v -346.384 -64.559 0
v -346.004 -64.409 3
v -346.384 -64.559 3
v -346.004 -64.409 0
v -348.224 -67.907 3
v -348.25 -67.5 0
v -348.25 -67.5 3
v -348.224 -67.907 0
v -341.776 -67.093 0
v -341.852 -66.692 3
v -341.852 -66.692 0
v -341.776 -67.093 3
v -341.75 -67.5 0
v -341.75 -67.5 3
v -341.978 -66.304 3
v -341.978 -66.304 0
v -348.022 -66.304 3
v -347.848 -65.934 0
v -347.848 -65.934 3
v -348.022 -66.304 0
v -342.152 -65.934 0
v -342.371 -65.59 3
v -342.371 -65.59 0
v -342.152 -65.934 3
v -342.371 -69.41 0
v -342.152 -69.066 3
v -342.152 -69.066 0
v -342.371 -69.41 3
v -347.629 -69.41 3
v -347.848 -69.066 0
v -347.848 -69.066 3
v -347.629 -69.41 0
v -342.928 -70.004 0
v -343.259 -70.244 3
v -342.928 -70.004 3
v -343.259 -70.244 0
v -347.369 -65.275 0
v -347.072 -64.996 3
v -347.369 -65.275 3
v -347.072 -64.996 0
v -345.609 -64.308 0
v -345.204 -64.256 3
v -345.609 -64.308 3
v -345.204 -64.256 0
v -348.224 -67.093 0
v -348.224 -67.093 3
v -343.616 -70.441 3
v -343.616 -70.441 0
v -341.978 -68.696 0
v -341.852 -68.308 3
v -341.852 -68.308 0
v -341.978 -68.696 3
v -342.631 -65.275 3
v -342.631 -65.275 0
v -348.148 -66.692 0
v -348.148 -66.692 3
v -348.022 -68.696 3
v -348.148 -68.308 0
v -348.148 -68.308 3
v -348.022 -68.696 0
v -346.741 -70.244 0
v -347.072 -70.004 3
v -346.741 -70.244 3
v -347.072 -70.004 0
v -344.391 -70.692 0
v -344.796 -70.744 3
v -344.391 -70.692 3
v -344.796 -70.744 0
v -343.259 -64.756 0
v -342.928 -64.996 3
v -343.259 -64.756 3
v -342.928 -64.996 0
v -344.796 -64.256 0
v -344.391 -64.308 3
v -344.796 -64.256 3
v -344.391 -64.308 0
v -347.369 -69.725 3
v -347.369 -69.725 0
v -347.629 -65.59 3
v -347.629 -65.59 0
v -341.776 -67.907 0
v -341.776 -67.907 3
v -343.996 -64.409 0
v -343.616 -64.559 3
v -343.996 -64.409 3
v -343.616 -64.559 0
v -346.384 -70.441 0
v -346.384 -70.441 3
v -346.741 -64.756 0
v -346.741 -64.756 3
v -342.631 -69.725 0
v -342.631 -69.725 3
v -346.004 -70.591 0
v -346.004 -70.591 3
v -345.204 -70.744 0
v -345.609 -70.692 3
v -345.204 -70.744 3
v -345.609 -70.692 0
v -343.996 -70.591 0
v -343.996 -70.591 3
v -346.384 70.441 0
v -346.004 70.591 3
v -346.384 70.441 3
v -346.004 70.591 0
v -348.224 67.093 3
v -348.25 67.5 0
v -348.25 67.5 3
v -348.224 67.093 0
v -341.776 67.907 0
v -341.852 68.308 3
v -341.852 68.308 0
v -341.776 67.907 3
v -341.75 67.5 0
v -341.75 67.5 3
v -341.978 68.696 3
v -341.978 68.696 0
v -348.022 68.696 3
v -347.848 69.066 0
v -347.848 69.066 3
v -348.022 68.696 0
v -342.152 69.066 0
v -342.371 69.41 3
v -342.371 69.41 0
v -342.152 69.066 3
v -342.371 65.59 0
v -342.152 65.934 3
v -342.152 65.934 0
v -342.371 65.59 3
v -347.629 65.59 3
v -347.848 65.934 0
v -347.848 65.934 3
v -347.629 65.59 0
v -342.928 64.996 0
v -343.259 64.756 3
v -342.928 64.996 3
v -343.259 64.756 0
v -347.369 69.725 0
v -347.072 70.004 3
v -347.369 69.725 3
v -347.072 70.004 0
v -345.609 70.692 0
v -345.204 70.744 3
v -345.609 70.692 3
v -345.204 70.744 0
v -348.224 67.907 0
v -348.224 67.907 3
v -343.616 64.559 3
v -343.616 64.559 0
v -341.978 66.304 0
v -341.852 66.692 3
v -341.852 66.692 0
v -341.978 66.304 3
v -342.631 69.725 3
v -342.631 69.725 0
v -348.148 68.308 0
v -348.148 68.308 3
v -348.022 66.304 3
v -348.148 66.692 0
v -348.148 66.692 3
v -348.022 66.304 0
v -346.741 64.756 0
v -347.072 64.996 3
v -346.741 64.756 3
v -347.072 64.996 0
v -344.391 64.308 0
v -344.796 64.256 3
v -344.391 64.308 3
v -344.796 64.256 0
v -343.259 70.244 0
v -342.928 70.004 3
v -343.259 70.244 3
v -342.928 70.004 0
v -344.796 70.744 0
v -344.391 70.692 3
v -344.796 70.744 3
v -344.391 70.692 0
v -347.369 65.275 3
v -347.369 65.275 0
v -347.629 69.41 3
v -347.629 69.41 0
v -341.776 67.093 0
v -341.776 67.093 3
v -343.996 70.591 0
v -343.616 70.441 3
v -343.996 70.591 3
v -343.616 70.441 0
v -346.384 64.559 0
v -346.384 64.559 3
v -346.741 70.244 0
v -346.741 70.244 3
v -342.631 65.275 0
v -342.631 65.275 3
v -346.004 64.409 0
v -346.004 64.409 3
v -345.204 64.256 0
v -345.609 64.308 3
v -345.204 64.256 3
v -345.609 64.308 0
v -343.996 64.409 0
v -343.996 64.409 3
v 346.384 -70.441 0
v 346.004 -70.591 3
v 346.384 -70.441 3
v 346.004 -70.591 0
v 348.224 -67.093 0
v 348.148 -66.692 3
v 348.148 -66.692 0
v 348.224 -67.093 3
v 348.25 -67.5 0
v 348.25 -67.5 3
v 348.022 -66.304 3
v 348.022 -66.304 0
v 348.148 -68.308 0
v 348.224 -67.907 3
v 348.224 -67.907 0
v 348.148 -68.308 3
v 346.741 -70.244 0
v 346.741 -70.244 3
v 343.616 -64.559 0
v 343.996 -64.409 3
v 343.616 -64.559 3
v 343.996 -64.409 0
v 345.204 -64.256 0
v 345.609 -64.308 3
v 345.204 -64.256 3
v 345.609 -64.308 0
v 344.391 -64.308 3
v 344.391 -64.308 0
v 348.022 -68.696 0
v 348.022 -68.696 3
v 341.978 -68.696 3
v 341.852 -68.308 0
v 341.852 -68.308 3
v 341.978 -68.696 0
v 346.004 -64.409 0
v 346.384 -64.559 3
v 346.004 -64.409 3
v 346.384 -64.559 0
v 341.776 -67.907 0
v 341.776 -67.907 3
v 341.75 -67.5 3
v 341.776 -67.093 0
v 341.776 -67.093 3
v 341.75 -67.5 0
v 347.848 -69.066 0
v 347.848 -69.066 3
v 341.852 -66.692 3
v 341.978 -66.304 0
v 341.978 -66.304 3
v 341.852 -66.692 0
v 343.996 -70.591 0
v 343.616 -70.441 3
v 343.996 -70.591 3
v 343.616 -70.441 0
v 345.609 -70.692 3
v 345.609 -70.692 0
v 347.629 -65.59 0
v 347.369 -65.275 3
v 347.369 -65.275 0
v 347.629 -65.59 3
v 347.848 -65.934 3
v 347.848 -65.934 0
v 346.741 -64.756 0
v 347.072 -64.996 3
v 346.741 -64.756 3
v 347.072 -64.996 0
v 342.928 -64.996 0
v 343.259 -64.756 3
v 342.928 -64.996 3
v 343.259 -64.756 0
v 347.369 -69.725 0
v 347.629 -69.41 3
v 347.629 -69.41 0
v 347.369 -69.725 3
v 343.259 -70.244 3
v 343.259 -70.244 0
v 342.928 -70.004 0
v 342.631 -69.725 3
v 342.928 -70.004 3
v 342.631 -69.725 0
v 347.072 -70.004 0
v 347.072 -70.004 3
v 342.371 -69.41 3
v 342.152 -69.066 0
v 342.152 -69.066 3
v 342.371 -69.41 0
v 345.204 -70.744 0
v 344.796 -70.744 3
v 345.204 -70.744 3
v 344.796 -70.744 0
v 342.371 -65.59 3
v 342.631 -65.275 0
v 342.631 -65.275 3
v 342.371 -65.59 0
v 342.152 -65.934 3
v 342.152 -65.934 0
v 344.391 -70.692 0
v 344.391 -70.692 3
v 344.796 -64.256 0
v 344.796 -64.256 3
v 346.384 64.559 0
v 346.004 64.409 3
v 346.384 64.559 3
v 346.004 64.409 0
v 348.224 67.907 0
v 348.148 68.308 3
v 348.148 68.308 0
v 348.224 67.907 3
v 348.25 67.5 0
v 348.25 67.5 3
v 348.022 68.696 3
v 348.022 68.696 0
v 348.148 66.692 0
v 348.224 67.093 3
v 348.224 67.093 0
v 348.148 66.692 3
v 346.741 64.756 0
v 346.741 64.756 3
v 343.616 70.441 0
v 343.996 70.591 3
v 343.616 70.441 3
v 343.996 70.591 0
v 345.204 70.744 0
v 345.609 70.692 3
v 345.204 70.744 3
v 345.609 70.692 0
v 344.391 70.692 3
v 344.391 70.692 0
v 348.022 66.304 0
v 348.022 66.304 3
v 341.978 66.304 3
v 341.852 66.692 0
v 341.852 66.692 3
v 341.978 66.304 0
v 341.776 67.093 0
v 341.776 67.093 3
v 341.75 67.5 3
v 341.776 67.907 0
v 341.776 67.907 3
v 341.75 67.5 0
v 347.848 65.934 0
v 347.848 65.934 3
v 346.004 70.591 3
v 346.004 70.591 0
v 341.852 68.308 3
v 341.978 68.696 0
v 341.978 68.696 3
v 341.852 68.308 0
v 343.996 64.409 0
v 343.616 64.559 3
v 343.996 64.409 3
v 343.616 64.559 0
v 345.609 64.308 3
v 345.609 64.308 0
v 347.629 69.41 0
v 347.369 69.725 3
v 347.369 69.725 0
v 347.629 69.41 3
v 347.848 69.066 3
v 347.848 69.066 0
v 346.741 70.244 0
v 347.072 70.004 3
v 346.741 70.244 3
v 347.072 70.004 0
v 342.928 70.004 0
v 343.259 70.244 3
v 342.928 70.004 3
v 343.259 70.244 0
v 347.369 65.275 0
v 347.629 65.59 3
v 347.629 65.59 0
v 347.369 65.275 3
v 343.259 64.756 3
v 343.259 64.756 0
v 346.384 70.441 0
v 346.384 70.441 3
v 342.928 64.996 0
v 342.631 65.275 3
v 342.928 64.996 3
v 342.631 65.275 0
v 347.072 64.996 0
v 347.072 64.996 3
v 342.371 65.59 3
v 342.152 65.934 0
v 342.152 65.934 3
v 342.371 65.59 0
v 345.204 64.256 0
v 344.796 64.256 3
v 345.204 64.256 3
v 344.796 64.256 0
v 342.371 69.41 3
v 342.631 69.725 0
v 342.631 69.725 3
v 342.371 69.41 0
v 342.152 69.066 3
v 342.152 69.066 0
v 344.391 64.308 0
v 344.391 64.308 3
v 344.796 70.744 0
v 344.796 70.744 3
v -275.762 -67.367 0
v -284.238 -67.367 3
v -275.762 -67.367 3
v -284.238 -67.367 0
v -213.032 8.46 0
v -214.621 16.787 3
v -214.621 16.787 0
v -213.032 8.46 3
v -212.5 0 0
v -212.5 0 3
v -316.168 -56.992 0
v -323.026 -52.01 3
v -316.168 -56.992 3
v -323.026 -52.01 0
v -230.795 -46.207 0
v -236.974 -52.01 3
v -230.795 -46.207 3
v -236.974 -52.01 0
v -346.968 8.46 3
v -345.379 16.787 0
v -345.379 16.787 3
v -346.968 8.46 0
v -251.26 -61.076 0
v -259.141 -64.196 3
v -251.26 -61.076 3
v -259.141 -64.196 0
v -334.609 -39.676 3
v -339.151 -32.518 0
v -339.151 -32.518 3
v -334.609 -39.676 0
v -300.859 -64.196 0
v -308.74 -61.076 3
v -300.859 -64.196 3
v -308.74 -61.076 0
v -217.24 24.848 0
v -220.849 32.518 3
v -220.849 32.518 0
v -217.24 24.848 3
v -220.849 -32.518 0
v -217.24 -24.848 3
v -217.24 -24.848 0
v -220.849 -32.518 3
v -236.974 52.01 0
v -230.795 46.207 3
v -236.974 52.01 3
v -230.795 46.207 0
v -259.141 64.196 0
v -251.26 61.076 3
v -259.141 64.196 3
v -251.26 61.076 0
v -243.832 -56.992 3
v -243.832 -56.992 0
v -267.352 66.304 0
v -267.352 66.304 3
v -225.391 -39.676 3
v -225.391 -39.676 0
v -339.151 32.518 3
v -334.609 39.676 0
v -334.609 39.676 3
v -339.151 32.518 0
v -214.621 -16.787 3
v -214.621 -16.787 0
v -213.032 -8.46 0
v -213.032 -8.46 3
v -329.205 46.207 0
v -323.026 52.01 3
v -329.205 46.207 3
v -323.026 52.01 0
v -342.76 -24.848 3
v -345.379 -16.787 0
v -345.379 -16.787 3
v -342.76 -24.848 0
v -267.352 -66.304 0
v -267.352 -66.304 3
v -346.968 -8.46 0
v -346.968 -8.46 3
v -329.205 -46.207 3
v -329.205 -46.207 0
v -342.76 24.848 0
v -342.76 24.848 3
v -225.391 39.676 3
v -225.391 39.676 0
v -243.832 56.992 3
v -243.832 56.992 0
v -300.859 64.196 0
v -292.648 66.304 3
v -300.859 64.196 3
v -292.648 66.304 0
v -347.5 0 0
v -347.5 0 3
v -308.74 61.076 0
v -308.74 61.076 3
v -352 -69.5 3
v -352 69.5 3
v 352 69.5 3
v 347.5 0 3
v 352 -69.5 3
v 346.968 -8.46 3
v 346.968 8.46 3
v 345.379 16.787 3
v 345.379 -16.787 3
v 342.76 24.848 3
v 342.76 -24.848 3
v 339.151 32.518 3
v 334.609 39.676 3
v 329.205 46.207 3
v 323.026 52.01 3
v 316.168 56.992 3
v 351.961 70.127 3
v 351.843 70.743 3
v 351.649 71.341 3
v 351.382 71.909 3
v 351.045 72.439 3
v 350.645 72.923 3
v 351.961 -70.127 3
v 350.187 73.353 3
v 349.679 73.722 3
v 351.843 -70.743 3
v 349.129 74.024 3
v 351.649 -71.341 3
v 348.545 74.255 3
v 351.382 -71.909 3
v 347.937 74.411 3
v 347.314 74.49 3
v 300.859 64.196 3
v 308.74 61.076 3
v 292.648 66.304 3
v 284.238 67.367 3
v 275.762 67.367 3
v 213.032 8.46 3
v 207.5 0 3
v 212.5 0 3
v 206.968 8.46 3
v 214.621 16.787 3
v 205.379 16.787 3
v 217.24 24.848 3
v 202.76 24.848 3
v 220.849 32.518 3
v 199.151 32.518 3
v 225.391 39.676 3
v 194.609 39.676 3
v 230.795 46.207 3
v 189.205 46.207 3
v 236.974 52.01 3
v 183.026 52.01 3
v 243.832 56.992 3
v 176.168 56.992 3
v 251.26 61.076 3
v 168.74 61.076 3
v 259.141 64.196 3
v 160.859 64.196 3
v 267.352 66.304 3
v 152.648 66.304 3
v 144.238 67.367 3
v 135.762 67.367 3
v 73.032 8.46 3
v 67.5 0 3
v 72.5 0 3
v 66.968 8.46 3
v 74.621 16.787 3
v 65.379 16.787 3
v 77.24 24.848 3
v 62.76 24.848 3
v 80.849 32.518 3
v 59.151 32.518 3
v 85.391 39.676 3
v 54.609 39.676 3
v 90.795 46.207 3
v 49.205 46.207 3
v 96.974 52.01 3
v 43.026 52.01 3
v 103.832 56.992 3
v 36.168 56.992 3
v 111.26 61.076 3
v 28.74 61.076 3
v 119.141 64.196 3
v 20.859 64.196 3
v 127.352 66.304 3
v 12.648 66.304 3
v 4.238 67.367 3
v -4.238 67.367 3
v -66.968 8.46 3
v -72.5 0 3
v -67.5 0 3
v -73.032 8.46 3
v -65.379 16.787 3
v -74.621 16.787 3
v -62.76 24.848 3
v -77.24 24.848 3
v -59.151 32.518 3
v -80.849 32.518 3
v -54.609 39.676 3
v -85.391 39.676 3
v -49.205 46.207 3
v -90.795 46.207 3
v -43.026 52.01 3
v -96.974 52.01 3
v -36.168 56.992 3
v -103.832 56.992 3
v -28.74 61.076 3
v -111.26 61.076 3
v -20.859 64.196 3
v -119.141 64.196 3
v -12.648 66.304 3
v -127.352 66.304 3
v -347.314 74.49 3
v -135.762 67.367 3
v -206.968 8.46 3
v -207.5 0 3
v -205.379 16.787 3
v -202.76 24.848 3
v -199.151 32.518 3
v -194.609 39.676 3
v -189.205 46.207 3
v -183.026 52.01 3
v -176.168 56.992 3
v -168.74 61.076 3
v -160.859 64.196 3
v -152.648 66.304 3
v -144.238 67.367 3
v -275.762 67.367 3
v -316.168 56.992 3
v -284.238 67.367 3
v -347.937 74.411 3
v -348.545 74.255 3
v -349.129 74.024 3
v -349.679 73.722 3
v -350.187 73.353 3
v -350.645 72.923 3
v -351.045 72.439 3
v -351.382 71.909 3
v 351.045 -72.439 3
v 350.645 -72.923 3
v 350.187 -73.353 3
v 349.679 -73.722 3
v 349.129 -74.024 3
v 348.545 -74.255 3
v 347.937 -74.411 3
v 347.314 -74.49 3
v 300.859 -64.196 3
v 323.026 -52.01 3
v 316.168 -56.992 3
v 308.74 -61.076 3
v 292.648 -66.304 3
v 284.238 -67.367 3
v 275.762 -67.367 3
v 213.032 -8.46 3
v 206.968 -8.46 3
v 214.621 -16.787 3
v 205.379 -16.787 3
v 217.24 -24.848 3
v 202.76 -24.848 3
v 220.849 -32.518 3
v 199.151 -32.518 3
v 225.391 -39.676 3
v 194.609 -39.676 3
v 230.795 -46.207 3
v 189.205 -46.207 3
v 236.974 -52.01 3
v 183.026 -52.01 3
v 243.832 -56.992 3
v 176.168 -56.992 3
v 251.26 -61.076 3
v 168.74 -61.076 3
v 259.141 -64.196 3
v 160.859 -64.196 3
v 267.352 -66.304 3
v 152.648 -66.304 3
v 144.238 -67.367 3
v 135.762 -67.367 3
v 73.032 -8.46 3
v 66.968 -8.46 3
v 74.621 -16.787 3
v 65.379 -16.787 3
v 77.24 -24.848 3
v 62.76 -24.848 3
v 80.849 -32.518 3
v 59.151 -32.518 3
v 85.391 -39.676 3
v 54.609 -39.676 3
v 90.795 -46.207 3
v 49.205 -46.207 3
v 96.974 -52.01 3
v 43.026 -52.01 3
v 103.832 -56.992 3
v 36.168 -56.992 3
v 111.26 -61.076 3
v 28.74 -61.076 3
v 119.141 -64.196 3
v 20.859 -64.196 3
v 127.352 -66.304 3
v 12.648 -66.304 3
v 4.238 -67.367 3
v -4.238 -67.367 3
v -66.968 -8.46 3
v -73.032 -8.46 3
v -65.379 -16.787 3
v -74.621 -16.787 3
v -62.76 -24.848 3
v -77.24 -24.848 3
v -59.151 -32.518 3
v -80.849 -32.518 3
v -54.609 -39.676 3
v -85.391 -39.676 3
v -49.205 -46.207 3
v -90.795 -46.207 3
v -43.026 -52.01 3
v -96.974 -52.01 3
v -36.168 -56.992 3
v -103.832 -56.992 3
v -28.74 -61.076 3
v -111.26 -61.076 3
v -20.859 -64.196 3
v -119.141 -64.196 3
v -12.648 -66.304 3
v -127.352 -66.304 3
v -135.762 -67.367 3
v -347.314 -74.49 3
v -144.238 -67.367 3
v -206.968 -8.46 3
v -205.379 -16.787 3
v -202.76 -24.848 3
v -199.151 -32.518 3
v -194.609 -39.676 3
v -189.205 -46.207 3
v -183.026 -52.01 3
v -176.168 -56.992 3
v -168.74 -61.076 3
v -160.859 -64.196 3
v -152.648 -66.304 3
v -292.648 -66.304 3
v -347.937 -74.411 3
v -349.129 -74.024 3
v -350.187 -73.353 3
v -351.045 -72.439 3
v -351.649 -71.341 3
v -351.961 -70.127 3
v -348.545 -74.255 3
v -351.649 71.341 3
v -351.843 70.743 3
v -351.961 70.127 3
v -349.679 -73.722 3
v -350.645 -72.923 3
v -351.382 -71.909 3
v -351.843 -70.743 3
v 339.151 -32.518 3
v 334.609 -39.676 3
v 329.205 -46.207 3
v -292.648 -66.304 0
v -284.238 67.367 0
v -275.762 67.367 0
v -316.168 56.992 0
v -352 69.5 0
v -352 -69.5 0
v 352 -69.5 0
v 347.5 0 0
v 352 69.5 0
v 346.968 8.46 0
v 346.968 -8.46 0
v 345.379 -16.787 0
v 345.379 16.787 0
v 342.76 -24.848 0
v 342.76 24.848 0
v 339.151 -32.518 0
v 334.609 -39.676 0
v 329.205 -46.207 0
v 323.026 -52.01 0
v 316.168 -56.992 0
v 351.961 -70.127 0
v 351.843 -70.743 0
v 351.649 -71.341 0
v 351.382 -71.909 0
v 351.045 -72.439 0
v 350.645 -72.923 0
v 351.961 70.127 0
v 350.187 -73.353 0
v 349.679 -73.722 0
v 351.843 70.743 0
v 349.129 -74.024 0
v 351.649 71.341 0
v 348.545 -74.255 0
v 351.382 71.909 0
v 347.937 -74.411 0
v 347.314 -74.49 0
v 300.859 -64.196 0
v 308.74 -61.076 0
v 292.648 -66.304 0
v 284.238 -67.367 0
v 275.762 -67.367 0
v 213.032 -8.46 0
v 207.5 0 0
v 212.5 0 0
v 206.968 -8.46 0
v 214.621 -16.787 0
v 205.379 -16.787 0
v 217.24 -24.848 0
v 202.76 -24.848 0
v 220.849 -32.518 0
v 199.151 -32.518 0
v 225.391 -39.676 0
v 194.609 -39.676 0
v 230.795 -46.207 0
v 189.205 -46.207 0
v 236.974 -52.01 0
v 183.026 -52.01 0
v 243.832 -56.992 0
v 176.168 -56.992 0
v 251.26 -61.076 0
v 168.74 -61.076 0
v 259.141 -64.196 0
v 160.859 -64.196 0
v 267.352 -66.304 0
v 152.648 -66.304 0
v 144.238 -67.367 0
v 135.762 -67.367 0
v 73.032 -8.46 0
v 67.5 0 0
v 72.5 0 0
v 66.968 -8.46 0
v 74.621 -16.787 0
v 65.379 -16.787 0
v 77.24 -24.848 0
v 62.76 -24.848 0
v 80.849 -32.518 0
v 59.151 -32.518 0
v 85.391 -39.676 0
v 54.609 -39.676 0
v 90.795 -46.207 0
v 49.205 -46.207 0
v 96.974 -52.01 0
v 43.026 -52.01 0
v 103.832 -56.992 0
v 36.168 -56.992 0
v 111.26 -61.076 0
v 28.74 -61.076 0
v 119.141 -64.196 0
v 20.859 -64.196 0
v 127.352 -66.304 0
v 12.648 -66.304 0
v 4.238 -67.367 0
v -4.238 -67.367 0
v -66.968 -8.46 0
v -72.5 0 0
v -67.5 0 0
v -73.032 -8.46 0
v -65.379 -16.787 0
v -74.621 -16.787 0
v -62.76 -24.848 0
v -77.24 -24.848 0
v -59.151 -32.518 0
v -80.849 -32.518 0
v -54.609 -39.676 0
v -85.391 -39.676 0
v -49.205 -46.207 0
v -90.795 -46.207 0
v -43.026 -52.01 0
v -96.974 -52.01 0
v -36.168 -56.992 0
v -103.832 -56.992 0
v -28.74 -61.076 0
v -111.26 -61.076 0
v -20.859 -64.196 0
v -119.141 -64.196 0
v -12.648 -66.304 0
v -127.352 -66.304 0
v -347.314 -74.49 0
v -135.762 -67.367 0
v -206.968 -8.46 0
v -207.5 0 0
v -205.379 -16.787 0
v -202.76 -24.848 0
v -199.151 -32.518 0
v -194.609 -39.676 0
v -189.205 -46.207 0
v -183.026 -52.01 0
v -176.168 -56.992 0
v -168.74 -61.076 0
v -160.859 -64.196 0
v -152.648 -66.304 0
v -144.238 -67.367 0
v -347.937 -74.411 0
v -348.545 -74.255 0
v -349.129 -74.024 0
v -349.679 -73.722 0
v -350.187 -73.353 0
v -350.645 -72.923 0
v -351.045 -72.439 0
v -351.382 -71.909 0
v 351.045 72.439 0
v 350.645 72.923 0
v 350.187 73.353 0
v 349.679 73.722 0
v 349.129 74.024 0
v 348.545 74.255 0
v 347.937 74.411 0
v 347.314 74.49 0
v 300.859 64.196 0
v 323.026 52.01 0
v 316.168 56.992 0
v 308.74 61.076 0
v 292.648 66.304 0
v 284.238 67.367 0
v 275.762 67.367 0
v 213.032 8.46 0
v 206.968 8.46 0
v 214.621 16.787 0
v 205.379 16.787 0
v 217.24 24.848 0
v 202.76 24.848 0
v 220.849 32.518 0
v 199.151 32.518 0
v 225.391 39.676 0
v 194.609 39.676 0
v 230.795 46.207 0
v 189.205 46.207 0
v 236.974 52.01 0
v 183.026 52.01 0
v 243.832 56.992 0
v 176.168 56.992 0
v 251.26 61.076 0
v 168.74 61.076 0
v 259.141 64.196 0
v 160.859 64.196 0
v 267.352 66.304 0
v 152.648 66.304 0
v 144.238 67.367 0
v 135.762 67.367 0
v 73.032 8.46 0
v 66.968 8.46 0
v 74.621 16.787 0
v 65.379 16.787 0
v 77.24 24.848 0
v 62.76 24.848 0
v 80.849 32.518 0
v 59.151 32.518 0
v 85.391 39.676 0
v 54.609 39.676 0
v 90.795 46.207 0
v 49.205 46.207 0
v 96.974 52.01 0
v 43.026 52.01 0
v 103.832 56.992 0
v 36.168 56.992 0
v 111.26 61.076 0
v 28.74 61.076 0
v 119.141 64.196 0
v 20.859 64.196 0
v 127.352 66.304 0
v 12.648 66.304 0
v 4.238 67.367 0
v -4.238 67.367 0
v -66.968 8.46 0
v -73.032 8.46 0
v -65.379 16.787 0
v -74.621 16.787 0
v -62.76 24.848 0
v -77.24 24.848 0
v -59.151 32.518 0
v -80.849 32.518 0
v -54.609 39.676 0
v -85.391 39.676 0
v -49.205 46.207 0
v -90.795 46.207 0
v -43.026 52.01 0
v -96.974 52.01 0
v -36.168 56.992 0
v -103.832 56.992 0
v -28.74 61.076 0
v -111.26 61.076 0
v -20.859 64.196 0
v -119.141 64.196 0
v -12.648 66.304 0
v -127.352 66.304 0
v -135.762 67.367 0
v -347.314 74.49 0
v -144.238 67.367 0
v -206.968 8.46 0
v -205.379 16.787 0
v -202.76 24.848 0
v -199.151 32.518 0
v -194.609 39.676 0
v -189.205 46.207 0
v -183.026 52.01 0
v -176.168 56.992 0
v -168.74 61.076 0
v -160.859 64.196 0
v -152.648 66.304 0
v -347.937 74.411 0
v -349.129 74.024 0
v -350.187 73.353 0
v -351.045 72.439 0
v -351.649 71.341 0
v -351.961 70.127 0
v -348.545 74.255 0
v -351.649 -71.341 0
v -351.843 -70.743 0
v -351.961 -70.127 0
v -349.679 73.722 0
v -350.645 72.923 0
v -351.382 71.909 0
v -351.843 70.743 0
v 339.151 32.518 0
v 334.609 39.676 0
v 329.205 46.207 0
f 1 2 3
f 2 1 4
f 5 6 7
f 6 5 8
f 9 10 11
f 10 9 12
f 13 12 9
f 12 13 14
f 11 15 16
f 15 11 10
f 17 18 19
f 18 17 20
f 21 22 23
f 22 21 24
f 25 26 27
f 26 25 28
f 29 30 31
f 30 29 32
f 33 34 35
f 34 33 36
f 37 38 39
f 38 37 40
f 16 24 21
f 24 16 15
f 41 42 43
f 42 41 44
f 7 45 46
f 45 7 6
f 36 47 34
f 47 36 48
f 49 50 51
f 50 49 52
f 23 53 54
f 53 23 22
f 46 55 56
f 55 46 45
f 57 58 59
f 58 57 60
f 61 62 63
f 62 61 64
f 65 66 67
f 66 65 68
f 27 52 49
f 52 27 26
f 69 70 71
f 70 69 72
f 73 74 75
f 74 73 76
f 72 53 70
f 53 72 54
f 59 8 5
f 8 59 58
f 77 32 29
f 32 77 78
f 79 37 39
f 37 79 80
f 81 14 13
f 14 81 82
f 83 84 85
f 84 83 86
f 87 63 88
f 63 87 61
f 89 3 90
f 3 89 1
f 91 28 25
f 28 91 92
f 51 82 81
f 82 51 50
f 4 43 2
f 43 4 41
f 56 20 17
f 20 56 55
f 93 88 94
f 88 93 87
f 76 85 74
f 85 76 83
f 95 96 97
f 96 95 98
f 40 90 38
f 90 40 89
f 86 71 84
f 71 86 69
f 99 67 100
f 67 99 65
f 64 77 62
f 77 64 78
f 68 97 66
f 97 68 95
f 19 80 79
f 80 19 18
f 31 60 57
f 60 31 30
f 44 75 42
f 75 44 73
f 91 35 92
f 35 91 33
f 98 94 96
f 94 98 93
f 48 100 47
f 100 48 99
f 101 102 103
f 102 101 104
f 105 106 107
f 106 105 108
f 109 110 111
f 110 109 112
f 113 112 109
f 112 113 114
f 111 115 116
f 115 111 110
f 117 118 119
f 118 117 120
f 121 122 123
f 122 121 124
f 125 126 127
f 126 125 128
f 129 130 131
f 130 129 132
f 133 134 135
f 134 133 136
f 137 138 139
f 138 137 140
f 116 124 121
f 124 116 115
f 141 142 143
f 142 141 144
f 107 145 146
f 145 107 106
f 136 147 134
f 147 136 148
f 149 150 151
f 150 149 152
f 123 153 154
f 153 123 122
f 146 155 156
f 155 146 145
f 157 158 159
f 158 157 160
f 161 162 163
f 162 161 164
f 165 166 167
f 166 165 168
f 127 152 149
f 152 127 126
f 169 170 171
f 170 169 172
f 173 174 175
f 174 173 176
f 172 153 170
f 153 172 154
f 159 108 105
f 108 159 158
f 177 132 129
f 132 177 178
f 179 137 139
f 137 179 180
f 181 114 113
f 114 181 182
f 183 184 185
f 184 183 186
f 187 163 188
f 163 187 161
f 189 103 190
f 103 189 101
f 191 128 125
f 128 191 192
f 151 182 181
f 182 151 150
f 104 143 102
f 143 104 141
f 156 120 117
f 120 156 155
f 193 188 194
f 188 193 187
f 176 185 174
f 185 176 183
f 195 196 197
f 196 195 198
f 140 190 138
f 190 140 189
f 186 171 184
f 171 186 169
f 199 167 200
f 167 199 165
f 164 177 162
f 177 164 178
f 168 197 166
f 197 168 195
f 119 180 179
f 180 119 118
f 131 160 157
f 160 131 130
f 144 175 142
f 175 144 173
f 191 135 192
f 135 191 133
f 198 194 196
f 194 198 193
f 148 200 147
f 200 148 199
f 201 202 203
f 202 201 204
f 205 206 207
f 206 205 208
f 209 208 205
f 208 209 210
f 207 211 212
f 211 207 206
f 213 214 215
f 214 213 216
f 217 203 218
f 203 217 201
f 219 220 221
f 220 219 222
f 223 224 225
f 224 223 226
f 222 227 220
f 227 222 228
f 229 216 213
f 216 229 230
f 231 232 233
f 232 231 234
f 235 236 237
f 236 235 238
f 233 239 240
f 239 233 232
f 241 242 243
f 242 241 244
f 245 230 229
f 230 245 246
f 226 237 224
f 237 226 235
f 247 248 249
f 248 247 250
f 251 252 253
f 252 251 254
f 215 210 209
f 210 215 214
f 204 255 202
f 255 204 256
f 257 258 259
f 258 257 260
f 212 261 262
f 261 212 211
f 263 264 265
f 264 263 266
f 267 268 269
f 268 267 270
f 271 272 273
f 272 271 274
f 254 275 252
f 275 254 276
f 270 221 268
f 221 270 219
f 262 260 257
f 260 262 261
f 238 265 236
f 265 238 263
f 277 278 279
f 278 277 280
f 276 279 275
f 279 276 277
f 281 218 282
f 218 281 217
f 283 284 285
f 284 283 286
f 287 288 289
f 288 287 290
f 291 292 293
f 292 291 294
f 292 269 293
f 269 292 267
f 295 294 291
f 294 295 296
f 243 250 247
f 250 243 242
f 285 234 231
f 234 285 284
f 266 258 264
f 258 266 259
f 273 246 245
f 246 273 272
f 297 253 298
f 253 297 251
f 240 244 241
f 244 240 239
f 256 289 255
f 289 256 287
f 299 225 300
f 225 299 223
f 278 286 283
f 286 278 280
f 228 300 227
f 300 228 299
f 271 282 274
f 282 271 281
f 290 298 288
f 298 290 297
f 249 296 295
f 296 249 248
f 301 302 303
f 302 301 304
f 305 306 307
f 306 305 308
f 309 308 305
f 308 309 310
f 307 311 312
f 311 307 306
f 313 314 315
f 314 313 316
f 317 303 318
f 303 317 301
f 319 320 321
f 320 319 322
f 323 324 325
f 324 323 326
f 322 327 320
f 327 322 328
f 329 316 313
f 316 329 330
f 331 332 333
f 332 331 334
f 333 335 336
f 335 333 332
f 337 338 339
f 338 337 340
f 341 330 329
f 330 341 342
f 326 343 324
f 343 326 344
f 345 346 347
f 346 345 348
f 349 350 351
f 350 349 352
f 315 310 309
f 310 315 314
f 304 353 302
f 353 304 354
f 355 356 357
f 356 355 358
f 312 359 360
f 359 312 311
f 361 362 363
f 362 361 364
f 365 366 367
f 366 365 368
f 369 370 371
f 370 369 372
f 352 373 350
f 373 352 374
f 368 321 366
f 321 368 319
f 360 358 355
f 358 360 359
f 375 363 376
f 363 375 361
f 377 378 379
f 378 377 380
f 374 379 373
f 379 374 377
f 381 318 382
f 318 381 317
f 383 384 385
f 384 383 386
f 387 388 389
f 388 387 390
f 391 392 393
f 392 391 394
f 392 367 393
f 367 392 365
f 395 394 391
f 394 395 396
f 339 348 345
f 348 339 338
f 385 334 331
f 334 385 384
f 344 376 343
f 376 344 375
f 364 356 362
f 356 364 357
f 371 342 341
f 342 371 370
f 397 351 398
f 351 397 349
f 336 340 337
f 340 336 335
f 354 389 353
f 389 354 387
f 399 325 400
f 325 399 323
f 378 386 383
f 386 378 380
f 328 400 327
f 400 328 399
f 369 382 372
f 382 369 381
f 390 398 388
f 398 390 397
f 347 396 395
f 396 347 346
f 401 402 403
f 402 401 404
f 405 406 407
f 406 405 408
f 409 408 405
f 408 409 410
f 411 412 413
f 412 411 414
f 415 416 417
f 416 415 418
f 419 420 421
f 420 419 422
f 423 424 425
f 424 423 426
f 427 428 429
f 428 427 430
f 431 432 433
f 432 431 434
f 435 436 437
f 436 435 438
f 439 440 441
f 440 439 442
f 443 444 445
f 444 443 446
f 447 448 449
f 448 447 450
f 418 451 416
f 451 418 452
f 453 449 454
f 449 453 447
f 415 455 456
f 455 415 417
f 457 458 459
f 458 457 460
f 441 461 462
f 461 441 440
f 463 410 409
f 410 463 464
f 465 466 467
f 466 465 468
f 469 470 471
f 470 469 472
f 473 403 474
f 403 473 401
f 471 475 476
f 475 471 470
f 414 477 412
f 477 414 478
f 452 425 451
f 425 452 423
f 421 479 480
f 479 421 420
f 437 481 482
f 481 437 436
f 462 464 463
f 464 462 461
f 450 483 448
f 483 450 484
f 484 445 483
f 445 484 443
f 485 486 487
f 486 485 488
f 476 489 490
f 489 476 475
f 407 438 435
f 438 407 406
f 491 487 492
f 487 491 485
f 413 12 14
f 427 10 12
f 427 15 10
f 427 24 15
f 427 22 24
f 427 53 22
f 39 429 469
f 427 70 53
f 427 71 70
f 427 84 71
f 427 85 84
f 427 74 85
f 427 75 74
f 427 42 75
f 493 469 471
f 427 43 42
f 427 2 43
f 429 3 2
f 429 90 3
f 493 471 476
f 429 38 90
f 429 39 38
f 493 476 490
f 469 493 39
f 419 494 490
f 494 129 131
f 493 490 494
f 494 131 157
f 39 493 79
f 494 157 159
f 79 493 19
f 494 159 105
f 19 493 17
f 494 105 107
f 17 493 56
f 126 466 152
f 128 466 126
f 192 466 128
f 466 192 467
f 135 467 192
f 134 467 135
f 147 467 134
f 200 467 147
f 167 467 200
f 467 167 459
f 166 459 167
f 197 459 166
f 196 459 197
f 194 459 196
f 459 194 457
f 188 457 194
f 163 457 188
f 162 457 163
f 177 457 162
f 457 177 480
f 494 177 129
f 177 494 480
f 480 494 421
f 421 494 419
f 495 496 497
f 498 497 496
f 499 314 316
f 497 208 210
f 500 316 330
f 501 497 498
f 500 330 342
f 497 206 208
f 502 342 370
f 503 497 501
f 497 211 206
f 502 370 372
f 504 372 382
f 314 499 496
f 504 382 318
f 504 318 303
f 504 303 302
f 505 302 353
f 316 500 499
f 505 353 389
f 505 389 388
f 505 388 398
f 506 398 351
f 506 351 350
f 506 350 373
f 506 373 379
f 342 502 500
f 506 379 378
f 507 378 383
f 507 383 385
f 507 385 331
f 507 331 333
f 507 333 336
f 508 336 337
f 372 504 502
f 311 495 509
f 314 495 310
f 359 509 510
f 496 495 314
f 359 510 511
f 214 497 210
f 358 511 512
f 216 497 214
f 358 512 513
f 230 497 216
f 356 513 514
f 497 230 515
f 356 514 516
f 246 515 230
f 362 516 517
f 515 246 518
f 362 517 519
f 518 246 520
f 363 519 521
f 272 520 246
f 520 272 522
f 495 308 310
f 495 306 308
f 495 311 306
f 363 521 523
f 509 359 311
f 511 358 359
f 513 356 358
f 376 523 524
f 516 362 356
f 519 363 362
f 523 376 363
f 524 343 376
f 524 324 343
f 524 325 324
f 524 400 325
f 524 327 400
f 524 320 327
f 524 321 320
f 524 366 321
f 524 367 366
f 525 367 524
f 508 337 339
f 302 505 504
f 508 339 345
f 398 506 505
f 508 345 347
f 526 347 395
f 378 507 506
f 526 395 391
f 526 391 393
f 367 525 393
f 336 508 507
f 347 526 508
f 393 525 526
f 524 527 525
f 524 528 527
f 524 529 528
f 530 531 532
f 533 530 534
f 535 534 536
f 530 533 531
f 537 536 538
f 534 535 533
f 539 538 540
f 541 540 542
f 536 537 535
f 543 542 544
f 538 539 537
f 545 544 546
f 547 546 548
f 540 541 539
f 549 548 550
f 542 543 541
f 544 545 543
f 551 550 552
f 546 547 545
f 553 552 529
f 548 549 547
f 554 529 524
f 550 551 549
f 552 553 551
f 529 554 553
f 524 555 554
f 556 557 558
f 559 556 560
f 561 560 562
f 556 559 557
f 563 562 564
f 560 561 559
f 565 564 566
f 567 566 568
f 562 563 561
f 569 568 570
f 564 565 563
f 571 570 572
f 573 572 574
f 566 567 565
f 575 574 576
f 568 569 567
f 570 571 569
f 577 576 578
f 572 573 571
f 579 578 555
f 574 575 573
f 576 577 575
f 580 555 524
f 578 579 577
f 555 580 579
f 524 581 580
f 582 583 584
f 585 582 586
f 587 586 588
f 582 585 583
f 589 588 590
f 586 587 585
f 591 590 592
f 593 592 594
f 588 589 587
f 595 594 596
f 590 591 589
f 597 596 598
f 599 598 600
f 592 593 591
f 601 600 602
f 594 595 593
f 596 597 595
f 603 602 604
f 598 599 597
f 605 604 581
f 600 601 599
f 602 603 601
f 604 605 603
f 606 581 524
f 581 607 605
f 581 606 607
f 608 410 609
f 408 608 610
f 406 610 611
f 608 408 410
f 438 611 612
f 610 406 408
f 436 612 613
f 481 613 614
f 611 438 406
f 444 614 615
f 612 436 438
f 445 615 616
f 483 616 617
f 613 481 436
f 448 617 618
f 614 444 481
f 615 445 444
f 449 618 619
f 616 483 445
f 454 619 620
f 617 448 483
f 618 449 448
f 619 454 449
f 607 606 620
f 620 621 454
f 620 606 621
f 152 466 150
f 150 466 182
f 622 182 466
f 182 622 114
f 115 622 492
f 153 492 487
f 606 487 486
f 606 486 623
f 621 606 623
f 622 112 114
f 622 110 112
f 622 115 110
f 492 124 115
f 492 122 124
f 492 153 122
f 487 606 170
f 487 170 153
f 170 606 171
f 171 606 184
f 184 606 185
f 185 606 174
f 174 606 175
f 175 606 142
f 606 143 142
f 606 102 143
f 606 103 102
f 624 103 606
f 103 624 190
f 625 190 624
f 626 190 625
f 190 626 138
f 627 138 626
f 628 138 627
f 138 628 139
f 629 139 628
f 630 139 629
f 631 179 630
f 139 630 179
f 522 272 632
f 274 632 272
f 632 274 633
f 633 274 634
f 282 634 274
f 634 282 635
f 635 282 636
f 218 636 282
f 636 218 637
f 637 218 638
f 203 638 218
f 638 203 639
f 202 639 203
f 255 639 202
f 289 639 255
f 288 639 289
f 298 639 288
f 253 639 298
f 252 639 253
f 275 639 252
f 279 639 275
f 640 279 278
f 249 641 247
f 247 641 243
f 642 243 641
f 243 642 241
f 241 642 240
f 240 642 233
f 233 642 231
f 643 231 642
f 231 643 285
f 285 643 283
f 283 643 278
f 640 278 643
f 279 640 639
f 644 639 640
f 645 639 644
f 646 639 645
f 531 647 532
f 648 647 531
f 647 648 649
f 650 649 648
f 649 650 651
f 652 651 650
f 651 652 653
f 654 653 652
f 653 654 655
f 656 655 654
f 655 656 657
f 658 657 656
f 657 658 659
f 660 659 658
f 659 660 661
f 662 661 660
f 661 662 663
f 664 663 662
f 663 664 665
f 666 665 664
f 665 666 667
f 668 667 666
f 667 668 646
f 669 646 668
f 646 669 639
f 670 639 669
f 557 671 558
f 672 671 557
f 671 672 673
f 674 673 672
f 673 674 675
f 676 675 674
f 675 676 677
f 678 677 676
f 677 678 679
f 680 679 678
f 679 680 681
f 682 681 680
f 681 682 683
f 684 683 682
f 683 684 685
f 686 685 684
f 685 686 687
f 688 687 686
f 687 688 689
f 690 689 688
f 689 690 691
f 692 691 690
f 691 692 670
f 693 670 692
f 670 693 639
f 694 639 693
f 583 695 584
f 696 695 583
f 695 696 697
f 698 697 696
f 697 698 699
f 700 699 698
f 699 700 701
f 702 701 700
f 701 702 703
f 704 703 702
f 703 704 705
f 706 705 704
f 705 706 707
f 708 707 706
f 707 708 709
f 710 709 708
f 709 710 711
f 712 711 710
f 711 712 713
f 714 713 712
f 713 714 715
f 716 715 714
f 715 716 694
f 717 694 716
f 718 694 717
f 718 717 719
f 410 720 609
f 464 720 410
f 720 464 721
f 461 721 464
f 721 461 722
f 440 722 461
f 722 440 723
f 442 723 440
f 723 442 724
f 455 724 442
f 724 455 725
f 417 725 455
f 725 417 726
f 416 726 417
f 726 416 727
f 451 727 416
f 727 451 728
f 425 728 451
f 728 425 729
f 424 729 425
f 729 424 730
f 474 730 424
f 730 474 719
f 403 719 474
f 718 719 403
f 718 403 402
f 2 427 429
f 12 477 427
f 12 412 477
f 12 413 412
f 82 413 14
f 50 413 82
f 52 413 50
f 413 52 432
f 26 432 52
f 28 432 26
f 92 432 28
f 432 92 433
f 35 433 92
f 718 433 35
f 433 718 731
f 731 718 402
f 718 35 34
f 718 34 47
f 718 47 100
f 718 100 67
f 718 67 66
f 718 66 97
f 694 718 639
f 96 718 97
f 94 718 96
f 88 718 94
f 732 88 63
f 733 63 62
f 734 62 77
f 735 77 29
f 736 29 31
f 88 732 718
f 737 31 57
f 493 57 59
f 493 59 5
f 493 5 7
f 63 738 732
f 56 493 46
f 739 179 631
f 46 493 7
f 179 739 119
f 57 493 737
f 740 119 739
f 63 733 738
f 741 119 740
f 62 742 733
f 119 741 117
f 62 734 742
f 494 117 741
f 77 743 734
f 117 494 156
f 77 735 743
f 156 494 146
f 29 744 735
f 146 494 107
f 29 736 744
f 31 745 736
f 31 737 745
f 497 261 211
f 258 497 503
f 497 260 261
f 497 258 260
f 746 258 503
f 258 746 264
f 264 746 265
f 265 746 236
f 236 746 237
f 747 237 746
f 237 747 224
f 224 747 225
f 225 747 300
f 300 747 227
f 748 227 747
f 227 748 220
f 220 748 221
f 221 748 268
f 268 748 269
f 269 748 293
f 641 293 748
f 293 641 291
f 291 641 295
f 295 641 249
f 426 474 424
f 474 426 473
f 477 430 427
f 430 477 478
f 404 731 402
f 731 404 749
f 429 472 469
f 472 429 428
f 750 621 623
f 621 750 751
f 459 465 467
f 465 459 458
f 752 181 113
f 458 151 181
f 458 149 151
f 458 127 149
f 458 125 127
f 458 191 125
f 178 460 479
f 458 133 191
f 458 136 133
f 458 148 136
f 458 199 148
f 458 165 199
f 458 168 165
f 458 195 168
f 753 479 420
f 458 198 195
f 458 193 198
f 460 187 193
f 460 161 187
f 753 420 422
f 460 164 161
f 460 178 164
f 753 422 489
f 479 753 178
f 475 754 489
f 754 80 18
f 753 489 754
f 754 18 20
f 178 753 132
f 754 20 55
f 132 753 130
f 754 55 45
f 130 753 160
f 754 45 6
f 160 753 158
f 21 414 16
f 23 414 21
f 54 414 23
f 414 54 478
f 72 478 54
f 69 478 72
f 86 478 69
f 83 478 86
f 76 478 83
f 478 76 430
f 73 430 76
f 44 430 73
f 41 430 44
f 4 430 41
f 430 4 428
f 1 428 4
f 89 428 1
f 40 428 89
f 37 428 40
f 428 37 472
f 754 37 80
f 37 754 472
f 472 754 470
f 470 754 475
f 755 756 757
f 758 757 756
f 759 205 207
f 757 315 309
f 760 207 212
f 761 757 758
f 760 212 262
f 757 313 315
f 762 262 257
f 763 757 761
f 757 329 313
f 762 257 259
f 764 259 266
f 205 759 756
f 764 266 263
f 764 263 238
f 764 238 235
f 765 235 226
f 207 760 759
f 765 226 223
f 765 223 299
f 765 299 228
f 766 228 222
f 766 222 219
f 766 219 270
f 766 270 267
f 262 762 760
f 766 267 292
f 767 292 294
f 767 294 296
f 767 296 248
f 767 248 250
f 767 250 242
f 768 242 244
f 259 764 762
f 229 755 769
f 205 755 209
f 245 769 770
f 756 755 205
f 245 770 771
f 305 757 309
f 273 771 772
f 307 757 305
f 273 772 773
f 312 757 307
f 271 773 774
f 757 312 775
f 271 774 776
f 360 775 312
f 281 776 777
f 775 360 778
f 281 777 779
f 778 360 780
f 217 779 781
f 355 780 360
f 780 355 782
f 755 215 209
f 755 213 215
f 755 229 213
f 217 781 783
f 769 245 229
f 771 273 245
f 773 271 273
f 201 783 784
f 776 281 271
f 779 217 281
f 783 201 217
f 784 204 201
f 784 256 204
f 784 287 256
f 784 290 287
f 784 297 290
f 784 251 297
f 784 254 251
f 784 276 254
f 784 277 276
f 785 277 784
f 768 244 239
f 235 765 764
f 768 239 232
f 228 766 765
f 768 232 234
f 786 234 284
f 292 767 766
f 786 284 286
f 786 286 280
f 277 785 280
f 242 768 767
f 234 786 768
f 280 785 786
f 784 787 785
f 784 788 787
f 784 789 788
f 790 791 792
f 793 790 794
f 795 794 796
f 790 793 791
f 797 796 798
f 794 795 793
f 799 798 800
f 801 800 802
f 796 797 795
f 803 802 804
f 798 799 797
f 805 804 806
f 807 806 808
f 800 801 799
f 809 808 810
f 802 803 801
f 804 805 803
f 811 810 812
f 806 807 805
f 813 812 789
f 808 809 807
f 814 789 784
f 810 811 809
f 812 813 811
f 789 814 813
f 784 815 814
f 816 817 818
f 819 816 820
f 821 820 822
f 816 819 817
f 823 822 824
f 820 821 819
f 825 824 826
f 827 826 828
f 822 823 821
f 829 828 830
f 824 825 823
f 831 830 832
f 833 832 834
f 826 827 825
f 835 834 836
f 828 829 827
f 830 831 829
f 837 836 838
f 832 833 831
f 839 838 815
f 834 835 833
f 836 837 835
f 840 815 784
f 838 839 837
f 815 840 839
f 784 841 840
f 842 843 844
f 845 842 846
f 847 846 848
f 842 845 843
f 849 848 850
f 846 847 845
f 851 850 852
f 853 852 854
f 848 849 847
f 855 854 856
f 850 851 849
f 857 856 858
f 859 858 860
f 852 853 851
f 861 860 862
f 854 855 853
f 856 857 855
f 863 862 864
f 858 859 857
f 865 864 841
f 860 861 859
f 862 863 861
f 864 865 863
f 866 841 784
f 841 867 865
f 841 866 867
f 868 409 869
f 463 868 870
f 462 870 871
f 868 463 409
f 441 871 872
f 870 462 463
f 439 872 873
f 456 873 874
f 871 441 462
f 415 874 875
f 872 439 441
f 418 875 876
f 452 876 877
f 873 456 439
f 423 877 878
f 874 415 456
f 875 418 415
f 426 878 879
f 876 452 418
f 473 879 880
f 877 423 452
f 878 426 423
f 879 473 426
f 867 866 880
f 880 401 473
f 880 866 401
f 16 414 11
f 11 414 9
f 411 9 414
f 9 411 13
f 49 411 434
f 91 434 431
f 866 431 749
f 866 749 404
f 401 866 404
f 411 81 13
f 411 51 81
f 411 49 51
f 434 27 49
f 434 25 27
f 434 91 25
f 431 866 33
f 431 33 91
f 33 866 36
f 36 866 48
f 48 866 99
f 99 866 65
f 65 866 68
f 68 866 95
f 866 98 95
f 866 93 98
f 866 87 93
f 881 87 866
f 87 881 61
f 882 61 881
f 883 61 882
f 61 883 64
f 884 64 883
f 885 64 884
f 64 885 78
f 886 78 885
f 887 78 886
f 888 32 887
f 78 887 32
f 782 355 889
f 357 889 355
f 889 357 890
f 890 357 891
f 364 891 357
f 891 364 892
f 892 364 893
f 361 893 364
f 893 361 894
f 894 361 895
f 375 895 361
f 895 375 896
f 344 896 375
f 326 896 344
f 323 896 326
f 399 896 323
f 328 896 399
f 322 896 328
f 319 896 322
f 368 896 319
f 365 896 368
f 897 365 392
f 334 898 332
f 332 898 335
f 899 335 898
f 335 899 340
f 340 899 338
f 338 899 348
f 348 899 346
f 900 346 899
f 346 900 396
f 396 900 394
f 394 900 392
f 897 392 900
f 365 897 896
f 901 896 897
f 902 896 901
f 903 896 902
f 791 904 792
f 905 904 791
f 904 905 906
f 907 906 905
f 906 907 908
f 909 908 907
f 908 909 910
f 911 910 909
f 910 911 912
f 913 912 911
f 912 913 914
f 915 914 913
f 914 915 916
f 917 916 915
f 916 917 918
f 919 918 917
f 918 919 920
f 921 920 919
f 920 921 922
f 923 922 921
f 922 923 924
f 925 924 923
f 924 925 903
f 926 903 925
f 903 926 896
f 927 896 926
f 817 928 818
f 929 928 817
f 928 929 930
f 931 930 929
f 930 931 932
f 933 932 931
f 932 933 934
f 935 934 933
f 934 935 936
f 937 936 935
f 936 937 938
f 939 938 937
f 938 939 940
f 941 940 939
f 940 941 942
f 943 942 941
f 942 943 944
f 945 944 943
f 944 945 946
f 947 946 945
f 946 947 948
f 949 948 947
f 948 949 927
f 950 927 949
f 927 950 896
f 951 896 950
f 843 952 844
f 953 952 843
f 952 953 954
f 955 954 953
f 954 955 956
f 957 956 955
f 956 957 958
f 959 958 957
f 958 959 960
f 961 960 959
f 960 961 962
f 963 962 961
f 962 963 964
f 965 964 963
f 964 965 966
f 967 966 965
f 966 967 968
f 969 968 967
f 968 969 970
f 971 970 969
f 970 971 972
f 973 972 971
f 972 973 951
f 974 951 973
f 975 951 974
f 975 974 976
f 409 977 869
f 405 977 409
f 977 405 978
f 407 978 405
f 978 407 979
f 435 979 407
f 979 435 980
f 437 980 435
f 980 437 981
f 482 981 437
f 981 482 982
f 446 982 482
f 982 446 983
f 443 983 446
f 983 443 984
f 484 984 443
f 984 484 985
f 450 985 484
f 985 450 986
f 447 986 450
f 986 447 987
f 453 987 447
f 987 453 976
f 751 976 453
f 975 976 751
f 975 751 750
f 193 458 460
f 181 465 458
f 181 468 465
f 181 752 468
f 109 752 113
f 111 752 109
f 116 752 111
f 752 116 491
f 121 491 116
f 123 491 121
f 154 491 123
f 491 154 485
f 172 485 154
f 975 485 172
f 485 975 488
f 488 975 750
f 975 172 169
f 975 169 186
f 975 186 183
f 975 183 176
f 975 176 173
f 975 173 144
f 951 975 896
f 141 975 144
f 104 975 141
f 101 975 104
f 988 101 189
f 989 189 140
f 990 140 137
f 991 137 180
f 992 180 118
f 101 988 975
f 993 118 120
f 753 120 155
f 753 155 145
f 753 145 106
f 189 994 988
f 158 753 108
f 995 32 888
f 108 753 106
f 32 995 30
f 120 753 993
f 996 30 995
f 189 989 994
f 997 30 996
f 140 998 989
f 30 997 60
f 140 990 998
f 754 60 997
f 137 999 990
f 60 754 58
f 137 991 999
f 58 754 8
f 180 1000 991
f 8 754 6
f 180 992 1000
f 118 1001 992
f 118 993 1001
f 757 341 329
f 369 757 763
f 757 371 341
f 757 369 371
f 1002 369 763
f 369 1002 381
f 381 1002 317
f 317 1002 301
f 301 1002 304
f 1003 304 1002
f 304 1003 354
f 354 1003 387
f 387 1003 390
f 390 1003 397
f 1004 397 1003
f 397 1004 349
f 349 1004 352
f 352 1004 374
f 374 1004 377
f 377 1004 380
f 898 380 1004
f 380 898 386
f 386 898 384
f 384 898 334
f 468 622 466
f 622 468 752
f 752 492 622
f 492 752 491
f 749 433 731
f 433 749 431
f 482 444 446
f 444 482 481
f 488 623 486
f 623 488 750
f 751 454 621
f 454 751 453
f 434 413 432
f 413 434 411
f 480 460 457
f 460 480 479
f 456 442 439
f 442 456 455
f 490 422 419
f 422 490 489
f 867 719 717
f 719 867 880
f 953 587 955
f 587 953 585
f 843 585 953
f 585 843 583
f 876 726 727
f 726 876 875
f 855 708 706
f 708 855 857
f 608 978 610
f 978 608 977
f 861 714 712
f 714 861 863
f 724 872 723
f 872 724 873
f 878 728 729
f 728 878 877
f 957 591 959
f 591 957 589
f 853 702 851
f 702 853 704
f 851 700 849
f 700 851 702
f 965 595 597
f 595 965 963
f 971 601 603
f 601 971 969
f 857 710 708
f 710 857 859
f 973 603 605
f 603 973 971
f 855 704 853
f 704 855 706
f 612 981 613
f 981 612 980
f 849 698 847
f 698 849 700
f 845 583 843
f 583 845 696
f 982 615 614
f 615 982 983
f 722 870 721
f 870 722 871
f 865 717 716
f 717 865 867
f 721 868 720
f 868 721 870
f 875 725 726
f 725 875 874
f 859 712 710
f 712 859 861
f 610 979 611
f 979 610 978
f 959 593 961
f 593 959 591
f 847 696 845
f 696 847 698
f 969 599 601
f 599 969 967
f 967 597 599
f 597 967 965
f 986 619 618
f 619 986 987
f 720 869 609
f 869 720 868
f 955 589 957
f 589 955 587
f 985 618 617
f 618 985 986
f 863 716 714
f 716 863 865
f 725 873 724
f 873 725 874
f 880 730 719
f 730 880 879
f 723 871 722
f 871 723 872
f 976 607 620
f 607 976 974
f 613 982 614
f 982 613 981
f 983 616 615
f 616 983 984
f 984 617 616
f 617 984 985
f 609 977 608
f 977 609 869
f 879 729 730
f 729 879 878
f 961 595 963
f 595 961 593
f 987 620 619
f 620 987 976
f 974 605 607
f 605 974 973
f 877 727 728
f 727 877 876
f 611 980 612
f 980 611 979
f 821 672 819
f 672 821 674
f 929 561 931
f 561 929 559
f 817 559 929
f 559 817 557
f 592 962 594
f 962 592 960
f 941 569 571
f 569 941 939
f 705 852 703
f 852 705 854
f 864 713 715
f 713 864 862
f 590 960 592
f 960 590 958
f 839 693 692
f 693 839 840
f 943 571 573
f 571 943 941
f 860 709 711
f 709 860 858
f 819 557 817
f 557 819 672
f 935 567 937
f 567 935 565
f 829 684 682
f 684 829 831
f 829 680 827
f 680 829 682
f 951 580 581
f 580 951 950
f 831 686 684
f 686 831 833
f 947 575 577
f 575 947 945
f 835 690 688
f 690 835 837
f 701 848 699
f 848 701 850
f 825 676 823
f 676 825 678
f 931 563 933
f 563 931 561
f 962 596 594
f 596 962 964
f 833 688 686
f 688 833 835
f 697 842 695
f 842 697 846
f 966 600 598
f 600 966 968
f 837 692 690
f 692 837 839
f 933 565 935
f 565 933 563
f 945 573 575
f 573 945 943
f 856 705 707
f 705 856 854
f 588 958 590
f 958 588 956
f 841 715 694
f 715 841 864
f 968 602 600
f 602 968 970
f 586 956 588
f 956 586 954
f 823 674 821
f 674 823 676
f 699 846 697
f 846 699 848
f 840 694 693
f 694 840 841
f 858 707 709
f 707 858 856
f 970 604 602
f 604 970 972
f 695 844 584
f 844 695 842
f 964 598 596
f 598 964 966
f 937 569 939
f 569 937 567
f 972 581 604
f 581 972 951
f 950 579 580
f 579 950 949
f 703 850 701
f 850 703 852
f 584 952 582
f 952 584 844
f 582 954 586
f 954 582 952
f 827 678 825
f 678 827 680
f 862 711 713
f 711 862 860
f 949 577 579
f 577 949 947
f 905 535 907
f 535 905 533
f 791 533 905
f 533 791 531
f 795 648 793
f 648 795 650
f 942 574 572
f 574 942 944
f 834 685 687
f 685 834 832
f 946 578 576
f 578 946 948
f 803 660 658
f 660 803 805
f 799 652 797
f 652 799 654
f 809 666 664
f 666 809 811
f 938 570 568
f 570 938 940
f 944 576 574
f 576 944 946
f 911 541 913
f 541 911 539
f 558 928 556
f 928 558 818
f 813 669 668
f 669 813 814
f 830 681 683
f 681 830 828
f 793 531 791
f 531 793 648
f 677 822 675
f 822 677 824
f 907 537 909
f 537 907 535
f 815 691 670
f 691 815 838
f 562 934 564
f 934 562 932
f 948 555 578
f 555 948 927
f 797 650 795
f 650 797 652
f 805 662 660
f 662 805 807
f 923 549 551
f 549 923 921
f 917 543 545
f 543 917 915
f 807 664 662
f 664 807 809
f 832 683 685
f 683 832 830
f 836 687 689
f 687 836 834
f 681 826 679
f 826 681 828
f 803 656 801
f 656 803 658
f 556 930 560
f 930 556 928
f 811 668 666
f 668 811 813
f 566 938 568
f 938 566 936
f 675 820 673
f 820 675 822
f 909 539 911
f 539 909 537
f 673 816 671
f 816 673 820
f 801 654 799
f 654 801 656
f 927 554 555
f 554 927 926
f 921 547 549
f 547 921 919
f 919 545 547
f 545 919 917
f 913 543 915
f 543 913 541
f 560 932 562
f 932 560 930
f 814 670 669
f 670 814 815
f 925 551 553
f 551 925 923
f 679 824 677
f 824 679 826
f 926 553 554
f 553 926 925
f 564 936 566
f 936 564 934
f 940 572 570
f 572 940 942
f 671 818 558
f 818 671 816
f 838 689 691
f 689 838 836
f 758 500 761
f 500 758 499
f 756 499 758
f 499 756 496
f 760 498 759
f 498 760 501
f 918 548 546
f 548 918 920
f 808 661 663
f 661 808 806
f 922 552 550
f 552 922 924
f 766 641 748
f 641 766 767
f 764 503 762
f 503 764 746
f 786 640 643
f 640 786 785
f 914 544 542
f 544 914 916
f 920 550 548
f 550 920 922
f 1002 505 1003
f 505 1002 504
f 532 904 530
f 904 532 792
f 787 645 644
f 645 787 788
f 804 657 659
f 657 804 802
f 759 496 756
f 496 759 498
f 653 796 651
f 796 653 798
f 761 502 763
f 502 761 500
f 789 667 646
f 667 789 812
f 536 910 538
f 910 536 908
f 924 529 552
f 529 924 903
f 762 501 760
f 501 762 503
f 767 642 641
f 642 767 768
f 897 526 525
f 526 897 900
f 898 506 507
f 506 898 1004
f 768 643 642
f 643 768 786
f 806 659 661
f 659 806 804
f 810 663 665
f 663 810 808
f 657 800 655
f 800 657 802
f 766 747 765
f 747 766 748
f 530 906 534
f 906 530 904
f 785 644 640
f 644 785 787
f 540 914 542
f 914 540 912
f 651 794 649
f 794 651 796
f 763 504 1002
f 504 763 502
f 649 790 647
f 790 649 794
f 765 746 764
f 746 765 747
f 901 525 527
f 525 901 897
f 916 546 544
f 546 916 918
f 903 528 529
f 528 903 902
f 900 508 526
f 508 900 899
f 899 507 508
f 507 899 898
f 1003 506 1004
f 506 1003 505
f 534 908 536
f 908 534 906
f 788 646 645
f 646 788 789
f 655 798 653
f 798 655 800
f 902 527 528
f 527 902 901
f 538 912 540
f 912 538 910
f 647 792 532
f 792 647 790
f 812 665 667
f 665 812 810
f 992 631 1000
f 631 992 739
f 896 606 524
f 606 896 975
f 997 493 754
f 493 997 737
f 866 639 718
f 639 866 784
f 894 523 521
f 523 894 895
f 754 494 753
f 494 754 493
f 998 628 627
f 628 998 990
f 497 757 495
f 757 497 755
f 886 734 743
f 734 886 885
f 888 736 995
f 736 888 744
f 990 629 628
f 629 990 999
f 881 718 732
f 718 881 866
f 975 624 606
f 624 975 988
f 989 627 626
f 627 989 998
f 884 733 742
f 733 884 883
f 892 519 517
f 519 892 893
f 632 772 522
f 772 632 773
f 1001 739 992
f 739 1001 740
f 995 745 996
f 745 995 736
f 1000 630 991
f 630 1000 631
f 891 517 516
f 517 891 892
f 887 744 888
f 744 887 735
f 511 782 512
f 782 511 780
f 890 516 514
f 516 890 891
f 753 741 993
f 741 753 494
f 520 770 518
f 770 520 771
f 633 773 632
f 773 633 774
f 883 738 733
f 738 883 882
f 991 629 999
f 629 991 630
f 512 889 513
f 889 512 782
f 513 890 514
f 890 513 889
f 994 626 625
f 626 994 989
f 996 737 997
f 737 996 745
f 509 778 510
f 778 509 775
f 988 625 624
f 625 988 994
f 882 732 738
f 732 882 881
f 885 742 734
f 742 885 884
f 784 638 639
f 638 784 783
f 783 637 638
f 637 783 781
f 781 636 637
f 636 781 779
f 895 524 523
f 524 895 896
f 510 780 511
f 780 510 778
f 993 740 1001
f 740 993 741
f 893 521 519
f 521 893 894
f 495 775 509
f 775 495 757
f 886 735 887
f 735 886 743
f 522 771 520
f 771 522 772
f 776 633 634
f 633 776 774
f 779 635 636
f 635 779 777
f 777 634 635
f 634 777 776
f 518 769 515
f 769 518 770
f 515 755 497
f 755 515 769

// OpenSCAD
$fn = 50;

difference() {
	union() {
		hull() {
			translate(v = [-347.0, 69.5, 0]) {
				cylinder(h = 3, r = 5);
			}
			translate(v = [347.0, 69.5, 0]) {
				cylinder(h = 3, r = 5);
			}
			translate(v = [-347.0, -69.5, 0]) {
				cylinder(h = 3, r = 5);
			}
			translate(v = [347.0, -69.5, 0]) {
				cylinder(h = 3, r = 5);
			}
		}
	}
	union() {
		translate(v = [-345.0, -67.5, -100.0]) {
			cylinder(h = 200, r = 3.25);
		}
		translate(v = [-345.0, 67.5, -100.0]) {
			cylinder(h = 200, r = 3.25);
		}
		translate(v = [345.0, -67.5, -100.0]) {
			cylinder(h = 200, r = 3.25);
		}
		translate(v = [345.0, 67.5, -100.0]) {
			cylinder(h = 200, r = 3.25);
		}
		translate(v = [-345.0, -67.5, -100.0]) {
			cylinder(h = 200, r = 1.8);
		}
		translate(v = [-345.0, 67.5, -100.0]) {
			cylinder(h = 200, r = 1.8);
		}
		translate(v = [345.0, -67.5, -100.0]) {
			cylinder(h = 200, r = 1.8);
		}
		translate(v = [345.0, 67.5, -100.0]) {
			cylinder(h = 200, r = 1.8);
		}
		translate(v = [-280.0, 0, 0.0]) {
			cylinder(h = 3, r = 67.5);
		}
		translate(v = [-140.0, 0, 0.0]) {
			cylinder(h = 3, r = 67.5);
		}
		cylinder(h = 3, r = 67.5);
		translate(v = [140.0, 0, 0.0]) {
			cylinder(h = 3, r = 67.5);
		}
		translate(v = [280.0, 0, 0.0]) {
			cylinder(h = 3, r = 67.5);
		}
	}
}
